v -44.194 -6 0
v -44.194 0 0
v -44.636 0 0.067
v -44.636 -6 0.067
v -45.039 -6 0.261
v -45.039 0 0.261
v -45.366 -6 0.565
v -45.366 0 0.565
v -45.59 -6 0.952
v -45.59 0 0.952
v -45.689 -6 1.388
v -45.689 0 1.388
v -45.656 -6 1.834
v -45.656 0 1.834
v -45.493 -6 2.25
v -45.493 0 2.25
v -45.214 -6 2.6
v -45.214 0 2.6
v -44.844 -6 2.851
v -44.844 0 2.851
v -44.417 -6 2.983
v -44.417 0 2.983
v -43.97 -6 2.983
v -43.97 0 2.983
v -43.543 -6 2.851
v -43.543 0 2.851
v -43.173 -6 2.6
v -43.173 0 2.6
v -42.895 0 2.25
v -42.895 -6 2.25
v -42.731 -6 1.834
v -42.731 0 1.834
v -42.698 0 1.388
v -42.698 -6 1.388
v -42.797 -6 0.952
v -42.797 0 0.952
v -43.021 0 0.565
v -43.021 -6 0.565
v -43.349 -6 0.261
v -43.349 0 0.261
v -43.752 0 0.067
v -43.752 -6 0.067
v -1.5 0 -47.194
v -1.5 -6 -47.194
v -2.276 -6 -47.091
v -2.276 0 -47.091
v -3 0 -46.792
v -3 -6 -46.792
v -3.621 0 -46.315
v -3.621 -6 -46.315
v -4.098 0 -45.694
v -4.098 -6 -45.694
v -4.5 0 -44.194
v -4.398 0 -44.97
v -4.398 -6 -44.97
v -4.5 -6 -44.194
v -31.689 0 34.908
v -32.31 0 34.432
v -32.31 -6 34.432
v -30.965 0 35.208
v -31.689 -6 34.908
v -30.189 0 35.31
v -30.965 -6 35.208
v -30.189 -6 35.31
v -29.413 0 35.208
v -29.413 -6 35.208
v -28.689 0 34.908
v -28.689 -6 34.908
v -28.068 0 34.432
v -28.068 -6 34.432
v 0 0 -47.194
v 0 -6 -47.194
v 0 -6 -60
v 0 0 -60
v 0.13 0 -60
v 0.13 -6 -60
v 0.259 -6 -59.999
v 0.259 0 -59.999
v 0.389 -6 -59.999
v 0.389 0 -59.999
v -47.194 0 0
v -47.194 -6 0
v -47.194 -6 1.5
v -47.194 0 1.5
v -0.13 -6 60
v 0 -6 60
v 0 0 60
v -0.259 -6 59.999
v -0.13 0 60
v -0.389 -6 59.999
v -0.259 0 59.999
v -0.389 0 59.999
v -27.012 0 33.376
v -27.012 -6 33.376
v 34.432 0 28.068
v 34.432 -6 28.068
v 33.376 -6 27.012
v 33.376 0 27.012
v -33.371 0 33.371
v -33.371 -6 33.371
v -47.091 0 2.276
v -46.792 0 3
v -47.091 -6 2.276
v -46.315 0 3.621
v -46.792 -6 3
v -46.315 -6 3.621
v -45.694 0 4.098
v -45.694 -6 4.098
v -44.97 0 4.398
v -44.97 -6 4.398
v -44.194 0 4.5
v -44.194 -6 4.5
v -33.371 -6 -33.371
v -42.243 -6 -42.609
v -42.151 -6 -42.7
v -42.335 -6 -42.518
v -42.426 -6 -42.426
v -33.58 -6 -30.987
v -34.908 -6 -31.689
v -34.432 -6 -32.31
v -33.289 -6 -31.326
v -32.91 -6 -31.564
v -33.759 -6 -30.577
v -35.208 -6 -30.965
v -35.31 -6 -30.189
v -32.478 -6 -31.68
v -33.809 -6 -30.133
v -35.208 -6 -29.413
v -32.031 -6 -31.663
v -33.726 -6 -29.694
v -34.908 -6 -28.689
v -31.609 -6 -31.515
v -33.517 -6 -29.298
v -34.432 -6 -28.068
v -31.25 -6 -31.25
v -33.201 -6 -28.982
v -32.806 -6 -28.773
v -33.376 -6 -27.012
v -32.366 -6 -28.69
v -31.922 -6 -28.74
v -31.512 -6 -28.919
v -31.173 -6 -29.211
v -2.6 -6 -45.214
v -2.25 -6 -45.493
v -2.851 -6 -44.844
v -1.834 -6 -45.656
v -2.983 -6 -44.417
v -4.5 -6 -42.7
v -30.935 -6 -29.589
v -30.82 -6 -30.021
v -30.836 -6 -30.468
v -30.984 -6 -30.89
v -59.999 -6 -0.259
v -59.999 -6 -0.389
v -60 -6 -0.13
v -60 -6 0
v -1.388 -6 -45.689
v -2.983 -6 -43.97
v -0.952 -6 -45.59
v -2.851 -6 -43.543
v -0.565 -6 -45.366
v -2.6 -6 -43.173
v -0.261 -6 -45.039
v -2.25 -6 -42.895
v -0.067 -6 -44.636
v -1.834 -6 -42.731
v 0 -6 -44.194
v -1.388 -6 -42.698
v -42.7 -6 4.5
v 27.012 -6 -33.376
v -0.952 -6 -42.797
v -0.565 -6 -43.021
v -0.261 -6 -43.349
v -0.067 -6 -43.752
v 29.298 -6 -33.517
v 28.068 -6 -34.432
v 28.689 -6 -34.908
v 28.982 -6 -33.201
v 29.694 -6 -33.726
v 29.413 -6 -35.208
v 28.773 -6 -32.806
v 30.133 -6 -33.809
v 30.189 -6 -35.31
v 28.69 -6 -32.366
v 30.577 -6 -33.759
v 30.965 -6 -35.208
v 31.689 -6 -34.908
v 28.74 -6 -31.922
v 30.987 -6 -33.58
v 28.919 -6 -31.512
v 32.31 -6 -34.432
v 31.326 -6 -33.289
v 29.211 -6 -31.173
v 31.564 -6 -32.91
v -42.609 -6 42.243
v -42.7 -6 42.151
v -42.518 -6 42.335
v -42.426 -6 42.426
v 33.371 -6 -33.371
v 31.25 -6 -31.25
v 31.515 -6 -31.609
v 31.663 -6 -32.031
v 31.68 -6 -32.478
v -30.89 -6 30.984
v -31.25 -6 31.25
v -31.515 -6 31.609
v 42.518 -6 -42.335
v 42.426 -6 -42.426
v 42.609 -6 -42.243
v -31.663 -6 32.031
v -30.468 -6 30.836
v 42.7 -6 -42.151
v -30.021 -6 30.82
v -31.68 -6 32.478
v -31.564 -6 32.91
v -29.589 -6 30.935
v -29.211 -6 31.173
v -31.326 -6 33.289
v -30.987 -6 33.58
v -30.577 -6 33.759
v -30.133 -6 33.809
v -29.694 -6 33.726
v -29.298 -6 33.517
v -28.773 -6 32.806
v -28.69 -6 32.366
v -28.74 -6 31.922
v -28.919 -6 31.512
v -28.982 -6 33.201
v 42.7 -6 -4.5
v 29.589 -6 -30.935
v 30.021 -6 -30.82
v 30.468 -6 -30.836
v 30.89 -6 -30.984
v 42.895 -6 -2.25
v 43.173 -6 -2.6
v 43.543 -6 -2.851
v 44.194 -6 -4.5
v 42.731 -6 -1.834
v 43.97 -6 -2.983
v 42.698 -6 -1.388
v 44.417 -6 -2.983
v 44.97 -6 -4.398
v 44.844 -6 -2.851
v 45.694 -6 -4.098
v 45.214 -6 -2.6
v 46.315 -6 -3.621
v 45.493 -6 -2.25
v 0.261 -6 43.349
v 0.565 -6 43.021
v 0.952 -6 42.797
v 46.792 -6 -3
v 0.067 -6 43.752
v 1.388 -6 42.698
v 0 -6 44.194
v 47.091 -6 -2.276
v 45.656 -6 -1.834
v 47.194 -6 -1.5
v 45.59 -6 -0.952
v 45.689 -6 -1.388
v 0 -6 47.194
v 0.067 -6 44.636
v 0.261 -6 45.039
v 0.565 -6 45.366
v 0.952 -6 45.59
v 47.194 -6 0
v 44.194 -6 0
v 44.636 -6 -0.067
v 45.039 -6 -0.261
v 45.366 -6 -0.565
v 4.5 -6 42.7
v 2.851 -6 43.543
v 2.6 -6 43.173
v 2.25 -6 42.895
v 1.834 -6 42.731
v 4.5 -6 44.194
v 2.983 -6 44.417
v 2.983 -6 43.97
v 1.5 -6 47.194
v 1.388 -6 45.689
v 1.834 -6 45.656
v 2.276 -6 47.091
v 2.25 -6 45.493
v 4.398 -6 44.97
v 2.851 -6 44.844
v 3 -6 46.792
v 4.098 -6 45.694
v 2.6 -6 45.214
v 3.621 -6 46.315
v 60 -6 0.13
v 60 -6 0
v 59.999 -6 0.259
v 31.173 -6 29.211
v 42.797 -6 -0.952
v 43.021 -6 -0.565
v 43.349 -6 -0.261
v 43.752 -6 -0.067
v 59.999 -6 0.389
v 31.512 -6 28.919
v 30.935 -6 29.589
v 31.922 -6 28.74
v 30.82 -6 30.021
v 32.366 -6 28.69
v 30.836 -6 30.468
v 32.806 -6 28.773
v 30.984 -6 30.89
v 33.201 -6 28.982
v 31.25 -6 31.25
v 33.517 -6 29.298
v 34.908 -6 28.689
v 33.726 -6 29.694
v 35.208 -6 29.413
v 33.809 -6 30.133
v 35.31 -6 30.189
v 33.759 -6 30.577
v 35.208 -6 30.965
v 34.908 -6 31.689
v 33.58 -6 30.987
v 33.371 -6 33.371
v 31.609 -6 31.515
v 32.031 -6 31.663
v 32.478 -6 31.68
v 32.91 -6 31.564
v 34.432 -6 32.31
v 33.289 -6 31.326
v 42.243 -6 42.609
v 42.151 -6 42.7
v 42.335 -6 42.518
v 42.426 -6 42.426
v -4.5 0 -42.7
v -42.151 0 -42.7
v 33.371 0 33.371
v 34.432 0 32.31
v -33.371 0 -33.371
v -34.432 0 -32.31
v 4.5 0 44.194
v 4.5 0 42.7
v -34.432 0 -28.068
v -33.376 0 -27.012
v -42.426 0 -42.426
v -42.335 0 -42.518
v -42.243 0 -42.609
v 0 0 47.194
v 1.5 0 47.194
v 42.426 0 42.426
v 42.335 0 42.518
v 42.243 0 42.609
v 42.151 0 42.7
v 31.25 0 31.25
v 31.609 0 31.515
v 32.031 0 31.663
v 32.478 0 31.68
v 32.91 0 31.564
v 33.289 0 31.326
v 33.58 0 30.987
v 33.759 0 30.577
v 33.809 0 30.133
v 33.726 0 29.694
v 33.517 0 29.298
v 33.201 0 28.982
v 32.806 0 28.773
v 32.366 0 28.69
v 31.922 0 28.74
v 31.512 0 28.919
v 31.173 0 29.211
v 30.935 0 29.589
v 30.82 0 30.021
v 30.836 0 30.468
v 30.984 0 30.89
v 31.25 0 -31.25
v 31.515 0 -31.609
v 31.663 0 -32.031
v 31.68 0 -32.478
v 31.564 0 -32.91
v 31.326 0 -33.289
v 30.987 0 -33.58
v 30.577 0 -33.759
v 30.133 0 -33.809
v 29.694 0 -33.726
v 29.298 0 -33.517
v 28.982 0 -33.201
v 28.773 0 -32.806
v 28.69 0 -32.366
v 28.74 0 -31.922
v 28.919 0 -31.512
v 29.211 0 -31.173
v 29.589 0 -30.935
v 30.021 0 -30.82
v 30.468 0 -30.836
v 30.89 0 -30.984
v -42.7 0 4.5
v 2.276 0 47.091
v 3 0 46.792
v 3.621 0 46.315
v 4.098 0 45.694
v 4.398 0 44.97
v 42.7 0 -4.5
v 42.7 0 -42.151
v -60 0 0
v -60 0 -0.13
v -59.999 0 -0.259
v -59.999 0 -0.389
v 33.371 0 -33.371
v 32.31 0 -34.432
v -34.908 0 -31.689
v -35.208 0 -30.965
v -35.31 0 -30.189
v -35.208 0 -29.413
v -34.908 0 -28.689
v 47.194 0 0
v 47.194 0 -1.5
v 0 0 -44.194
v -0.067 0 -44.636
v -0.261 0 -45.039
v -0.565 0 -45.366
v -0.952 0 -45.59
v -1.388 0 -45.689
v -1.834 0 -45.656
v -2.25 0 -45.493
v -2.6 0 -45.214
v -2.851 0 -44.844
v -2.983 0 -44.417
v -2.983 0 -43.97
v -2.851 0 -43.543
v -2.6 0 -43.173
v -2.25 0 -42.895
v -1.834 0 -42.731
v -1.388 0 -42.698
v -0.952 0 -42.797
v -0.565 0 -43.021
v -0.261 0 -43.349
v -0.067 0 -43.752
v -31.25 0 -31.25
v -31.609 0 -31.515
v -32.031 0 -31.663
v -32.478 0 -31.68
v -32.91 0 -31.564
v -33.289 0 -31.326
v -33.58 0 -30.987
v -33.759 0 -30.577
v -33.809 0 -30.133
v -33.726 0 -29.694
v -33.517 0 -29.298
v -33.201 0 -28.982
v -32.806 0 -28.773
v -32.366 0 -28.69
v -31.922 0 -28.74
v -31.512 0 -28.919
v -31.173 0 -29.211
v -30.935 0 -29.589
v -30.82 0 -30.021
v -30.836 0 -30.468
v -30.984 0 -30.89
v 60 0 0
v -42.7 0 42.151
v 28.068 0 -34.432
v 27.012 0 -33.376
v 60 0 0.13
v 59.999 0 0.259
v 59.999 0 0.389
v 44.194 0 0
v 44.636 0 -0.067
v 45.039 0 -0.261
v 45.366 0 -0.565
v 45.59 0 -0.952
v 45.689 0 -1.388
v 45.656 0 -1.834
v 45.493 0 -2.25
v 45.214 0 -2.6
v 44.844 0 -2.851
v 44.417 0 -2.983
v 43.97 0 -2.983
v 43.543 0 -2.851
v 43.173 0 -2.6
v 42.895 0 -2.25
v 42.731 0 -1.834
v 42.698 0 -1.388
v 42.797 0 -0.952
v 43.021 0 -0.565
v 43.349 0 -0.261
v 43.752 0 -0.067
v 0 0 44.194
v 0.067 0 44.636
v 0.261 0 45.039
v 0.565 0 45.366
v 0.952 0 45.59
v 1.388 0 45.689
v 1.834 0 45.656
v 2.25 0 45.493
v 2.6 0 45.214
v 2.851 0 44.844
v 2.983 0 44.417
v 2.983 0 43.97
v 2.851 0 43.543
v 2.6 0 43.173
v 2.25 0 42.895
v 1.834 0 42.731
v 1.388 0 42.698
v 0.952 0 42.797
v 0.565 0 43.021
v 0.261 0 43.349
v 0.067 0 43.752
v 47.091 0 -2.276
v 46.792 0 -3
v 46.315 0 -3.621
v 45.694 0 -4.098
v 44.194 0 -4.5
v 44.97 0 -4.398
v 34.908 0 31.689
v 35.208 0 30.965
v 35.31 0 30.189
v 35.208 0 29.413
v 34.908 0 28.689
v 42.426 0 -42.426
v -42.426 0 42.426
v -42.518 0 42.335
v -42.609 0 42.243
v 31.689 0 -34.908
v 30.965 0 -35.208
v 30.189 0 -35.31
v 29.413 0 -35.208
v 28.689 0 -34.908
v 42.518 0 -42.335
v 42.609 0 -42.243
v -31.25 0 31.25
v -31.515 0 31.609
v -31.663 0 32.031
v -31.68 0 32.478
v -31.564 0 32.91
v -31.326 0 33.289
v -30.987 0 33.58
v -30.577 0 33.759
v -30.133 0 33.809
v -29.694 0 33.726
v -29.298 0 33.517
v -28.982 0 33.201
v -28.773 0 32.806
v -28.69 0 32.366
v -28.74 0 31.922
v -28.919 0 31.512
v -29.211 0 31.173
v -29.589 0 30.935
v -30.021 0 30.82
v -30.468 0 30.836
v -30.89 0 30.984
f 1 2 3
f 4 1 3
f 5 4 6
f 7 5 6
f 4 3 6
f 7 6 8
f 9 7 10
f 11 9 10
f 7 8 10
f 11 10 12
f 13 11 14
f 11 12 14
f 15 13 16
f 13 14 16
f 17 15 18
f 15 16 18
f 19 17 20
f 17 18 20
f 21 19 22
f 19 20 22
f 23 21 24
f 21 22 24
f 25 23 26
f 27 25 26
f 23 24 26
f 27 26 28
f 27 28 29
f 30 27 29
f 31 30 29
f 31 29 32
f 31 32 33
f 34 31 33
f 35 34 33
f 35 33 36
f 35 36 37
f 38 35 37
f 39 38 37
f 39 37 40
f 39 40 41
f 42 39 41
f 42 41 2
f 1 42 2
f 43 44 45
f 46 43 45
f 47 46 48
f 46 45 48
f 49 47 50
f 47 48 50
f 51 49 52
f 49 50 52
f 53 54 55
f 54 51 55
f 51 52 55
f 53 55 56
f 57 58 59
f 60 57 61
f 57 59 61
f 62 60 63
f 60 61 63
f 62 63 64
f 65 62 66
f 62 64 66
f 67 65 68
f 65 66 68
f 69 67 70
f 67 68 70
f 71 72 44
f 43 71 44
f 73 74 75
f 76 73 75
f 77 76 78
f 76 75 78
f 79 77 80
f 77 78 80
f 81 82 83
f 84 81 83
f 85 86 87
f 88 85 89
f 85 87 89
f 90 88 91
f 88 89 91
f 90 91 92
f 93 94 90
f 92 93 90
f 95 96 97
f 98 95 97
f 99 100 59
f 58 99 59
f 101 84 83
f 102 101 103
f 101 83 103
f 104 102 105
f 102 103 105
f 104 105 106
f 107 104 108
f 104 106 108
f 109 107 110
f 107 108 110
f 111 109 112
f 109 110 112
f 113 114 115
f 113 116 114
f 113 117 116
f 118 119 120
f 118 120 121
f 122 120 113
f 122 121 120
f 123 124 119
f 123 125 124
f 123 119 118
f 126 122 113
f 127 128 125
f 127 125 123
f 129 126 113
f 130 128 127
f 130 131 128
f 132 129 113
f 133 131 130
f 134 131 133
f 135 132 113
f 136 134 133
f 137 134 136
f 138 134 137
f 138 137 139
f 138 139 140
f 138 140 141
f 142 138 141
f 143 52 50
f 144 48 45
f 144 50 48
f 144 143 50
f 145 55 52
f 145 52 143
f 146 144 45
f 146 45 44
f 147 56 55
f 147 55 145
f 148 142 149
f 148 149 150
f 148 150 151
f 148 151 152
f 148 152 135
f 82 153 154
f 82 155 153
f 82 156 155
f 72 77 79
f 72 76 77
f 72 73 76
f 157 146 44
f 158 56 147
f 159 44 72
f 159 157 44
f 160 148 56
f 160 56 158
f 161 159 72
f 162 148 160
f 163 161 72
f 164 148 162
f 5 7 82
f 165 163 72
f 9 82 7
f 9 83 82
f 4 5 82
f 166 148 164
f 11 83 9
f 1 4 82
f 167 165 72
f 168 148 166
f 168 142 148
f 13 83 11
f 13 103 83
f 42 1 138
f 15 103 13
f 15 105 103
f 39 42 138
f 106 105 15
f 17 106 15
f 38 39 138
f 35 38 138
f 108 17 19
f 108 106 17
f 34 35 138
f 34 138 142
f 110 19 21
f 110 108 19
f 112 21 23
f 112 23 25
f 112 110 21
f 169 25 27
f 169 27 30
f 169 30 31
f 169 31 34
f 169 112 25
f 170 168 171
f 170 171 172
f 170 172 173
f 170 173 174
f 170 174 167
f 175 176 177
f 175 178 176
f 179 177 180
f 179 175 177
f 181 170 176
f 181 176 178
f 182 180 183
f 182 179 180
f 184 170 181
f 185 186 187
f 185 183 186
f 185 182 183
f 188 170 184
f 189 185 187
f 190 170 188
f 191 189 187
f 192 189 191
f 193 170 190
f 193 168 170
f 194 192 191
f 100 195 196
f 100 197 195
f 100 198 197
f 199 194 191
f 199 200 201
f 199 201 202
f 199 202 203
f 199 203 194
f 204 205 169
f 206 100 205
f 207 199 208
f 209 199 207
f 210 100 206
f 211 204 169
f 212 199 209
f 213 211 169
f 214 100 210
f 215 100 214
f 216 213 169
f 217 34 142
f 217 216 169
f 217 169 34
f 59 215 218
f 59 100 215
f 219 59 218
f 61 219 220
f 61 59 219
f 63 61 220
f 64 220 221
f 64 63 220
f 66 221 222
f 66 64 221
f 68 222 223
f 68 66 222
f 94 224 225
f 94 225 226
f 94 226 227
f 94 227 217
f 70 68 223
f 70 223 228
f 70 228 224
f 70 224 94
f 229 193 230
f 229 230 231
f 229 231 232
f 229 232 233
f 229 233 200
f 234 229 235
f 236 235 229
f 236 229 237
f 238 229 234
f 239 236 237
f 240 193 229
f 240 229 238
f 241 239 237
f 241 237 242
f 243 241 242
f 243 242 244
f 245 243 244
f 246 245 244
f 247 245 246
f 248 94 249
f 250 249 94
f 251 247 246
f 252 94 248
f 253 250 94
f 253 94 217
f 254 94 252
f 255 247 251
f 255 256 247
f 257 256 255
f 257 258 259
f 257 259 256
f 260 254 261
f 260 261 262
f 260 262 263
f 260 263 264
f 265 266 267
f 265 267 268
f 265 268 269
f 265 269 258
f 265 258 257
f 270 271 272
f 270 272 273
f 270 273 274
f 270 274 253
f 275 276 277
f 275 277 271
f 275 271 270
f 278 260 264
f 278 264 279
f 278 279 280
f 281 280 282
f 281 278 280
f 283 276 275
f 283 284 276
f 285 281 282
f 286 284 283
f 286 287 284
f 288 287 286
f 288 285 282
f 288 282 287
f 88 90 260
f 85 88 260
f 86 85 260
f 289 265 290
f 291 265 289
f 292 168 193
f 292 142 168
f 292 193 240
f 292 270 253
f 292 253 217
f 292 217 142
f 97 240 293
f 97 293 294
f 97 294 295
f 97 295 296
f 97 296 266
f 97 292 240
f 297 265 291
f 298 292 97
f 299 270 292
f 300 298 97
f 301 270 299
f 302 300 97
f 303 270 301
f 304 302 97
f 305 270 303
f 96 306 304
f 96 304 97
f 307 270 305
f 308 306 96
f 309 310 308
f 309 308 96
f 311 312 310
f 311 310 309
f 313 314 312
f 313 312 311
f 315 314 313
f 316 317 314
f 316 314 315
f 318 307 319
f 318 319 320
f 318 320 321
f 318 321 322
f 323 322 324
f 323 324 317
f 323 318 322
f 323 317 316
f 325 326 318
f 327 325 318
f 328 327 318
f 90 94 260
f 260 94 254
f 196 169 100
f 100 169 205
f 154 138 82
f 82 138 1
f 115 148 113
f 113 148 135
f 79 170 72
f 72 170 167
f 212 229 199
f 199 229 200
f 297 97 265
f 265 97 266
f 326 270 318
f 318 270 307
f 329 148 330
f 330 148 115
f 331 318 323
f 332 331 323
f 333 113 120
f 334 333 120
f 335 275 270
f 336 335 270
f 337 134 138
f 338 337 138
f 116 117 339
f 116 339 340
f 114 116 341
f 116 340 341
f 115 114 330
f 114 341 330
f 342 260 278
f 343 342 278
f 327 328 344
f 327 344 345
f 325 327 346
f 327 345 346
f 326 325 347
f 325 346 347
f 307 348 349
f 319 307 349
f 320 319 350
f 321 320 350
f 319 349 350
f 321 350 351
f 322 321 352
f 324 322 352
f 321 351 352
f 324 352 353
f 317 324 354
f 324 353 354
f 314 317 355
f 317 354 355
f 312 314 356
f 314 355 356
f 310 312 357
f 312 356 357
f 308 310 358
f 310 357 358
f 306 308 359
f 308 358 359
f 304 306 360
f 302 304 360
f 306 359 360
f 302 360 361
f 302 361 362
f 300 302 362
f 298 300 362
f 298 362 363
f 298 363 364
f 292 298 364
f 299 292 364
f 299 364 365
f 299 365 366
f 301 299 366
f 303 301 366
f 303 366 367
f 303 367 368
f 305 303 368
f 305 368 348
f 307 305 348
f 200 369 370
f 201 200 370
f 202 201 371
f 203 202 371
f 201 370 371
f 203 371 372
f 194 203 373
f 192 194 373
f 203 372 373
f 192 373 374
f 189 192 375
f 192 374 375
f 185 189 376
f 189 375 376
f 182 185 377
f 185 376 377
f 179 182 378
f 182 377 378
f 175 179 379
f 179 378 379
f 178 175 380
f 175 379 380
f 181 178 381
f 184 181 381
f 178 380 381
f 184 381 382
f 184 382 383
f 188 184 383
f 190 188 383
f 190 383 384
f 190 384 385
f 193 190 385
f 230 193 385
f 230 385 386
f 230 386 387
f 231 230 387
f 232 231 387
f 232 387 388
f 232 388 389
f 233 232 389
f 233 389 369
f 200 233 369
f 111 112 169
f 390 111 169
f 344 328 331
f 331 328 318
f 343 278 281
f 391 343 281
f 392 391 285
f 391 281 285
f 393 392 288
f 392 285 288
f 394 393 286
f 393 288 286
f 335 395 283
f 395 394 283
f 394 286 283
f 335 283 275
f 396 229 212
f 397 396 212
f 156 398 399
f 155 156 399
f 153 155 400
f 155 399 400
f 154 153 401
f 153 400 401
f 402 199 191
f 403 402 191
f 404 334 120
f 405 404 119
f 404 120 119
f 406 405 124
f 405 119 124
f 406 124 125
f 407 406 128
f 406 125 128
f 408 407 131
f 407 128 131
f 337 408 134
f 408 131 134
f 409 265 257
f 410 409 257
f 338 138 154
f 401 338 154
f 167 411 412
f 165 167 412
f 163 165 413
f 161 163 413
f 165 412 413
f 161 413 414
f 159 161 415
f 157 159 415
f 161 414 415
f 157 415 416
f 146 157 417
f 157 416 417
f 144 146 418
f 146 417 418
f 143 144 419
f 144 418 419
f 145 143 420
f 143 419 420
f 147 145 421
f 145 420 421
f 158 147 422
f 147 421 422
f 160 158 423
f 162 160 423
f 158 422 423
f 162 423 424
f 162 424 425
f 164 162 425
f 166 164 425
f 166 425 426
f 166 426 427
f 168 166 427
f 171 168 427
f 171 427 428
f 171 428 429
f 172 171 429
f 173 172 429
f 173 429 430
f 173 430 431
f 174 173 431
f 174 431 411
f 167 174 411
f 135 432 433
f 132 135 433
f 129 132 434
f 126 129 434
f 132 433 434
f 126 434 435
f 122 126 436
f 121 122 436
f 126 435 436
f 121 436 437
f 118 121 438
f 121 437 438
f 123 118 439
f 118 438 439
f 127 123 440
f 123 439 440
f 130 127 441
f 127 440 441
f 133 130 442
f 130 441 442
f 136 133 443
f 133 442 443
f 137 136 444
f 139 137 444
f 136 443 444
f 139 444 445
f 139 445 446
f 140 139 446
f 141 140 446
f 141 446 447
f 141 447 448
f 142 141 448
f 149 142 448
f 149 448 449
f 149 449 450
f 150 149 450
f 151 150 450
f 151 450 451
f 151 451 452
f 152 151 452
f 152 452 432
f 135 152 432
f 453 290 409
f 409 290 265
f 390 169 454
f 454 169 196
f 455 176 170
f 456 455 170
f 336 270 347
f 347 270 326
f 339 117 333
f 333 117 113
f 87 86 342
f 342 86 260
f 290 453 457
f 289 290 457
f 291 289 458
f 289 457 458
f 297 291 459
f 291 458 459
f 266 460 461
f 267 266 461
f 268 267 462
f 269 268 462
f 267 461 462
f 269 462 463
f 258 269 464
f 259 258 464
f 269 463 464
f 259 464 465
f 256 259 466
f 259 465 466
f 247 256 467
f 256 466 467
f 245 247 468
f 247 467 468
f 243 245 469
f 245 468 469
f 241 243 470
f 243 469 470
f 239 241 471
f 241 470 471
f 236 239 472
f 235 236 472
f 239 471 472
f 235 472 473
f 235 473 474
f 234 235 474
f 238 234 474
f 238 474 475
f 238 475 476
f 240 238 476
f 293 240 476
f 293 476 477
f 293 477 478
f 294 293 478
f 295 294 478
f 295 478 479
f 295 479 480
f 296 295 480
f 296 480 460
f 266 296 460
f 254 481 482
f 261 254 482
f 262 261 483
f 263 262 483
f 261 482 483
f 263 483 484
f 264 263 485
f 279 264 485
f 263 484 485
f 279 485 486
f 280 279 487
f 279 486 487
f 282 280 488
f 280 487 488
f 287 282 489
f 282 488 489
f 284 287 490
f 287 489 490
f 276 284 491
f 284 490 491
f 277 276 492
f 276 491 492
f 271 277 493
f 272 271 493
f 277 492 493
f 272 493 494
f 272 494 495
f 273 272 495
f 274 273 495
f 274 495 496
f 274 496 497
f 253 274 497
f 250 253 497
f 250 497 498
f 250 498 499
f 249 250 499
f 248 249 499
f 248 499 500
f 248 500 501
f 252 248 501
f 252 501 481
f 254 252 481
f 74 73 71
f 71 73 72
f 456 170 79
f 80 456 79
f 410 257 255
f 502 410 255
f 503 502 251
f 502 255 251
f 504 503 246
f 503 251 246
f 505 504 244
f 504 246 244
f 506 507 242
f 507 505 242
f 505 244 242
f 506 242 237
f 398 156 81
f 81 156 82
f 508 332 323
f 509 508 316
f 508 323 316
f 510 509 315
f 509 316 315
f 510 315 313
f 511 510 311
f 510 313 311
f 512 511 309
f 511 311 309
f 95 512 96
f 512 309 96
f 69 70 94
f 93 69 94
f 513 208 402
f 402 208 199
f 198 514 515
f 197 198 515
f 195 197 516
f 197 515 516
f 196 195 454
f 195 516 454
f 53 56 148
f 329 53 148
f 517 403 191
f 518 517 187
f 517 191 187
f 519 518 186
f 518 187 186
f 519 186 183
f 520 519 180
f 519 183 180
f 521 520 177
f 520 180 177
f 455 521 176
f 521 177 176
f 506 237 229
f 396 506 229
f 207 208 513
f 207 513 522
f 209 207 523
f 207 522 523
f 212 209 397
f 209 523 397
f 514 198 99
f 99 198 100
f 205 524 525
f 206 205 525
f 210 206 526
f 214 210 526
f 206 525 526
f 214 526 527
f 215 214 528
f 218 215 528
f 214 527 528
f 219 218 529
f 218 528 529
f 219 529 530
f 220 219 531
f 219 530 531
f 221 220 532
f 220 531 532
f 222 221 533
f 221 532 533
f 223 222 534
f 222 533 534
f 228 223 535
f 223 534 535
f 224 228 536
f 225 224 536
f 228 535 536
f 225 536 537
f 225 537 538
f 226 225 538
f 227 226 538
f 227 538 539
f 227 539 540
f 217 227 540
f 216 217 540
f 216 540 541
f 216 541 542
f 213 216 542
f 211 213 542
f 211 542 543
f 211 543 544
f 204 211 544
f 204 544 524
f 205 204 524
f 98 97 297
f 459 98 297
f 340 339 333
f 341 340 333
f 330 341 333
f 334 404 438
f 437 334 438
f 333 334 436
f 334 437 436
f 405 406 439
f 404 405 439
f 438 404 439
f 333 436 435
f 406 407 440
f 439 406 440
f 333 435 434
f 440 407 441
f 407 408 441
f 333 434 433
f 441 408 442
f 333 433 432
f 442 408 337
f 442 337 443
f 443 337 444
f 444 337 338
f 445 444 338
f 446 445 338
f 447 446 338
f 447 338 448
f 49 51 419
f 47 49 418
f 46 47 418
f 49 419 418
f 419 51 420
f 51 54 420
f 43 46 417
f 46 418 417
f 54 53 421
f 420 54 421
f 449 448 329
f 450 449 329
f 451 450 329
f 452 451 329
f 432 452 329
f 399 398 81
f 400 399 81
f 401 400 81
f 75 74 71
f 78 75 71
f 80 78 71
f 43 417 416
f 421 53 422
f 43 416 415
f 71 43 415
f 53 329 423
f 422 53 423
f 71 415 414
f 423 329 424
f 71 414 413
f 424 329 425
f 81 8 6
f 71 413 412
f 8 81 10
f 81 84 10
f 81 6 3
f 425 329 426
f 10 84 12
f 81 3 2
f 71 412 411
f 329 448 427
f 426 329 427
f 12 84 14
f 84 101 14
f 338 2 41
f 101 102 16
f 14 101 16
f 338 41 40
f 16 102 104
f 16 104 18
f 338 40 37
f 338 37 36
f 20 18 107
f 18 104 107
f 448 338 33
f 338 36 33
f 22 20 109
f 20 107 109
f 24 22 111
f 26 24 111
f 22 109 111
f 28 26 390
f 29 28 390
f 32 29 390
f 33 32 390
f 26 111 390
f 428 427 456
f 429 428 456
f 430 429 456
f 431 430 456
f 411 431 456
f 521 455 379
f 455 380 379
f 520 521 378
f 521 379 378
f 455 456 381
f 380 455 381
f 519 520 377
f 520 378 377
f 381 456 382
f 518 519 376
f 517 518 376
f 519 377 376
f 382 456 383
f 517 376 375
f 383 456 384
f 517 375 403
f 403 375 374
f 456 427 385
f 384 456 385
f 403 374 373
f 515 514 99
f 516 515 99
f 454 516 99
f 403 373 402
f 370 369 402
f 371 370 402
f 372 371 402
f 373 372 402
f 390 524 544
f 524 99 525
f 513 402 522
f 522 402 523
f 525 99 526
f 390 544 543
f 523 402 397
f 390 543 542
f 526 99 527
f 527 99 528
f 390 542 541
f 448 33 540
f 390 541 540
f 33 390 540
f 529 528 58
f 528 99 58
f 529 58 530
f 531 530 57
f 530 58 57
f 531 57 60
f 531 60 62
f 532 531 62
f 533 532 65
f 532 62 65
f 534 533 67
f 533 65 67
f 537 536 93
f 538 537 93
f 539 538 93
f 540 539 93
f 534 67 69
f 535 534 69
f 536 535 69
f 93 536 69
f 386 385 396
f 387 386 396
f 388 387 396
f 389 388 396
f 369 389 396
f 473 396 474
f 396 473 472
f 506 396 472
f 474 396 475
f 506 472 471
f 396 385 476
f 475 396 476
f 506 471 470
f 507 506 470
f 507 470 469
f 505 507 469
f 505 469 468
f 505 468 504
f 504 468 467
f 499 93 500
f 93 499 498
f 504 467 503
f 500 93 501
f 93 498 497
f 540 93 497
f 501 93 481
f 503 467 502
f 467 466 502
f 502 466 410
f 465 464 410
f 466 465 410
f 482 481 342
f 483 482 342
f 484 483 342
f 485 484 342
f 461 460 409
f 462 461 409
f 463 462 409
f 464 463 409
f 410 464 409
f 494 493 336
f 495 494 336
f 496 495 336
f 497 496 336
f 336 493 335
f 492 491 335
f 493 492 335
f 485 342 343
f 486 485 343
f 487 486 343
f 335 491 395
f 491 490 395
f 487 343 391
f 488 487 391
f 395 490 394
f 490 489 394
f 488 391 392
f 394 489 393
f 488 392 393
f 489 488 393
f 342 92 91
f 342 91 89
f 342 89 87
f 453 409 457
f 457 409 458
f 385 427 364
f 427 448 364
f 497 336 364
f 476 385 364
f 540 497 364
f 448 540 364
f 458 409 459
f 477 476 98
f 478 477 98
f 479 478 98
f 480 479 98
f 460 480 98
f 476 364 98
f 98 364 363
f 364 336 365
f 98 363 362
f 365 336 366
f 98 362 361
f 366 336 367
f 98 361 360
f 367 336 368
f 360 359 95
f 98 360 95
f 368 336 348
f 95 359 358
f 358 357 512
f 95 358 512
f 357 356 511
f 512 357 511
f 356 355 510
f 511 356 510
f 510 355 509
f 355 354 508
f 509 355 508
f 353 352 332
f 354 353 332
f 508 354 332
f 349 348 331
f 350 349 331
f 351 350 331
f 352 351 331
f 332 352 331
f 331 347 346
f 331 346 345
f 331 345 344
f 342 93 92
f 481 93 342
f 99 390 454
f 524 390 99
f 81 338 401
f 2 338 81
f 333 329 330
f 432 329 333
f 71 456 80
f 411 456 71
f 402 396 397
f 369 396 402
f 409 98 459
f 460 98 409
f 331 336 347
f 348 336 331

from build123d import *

# Parameters (mm, degrees)
F0_R            = 60
F2_DEPTH        = 6
F4_D            = 3
F4_COPIES_COUNT = 8
F6_DEPTH        = 25
F6_COPIES_COUNT = 8


# Not quite as in the source:
# - a pattern or mirror of a feature is missing from the dataset's text; its kind, count and spacing are read off the source's solid


with BuildPart() as f2:
    # F0 (on Front) → F2 (new body)
    with BuildSketch(Plane.XZ):
        Circle(F0_R)
    extrude(amount=F2_DEPTH)

    # F4 (through all)
    with Locations(Plane.XZ.offset(6)):
        with Locations((1.5, 44.1936596632)):
            f4 = Hole(F4_D / 2)

    # F4_copies: F4 ×8 about axis
    f4_copies_axis = Axis((0, 0, 0), (0, 1, 0))
    for i in range(1, F4_COPIES_COUNT):
        add(f4.rotate(f4_copies_axis, i * 360 / F4_COPIES_COUNT), mode=Mode.SUBTRACT)

    # F5 (on face) → F6 (cut)
    with BuildSketch(Plane.XZ.offset(6)):
        with BuildLine():
            Line((4.5, 44.1936596632), (4.5, 42.7004098892))
            Line((4.5, 42.7004098892), (42.1506227154, 42.7004098892))
            ThreePointArc((42.1506227154, 42.7004098892), (22.7813016161, 55.5068671128), (0, 60))
            Line((0, 60), (0, 47.1936596632))
            Line((0, 47.1936596632), (1.5, 47.1936596632))
            ThreePointArc((1.5, 47.1936596632), (3.6213203436, 46.3149800068), (4.5, 44.1936596632))
        make_face()
        with BuildLine():
            ThreePointArc((0, 60), (22.7813016161, 55.5068671128), (42.1506227154, 42.7004098892))
            Line((42.1506227154, 42.7004098892), (58.9860603213, 42.7004098892))
            Line((58.9860603213, 42.7004098892), (58.9860603213, 64.2154142261))
            Line((58.9860603213, 64.2154142261), (0, 64.2154142261))
            Line((0, 64.2154142261), (0, 60))
        make_face()
    f6 = extrude(amount=-F6_DEPTH, mode=Mode.SUBTRACT)

    # F6_copies: F6 ×8 about axis
    f6_copies_axis = Axis((0, 0, 0), (0, 1, 0))
    for i in range(1, F6_COPIES_COUNT):
        add(f6.rotate(f6_copies_axis, i * 360 / F6_COPIES_COUNT), mode=Mode.SUBTRACT)


solid = f2.part
